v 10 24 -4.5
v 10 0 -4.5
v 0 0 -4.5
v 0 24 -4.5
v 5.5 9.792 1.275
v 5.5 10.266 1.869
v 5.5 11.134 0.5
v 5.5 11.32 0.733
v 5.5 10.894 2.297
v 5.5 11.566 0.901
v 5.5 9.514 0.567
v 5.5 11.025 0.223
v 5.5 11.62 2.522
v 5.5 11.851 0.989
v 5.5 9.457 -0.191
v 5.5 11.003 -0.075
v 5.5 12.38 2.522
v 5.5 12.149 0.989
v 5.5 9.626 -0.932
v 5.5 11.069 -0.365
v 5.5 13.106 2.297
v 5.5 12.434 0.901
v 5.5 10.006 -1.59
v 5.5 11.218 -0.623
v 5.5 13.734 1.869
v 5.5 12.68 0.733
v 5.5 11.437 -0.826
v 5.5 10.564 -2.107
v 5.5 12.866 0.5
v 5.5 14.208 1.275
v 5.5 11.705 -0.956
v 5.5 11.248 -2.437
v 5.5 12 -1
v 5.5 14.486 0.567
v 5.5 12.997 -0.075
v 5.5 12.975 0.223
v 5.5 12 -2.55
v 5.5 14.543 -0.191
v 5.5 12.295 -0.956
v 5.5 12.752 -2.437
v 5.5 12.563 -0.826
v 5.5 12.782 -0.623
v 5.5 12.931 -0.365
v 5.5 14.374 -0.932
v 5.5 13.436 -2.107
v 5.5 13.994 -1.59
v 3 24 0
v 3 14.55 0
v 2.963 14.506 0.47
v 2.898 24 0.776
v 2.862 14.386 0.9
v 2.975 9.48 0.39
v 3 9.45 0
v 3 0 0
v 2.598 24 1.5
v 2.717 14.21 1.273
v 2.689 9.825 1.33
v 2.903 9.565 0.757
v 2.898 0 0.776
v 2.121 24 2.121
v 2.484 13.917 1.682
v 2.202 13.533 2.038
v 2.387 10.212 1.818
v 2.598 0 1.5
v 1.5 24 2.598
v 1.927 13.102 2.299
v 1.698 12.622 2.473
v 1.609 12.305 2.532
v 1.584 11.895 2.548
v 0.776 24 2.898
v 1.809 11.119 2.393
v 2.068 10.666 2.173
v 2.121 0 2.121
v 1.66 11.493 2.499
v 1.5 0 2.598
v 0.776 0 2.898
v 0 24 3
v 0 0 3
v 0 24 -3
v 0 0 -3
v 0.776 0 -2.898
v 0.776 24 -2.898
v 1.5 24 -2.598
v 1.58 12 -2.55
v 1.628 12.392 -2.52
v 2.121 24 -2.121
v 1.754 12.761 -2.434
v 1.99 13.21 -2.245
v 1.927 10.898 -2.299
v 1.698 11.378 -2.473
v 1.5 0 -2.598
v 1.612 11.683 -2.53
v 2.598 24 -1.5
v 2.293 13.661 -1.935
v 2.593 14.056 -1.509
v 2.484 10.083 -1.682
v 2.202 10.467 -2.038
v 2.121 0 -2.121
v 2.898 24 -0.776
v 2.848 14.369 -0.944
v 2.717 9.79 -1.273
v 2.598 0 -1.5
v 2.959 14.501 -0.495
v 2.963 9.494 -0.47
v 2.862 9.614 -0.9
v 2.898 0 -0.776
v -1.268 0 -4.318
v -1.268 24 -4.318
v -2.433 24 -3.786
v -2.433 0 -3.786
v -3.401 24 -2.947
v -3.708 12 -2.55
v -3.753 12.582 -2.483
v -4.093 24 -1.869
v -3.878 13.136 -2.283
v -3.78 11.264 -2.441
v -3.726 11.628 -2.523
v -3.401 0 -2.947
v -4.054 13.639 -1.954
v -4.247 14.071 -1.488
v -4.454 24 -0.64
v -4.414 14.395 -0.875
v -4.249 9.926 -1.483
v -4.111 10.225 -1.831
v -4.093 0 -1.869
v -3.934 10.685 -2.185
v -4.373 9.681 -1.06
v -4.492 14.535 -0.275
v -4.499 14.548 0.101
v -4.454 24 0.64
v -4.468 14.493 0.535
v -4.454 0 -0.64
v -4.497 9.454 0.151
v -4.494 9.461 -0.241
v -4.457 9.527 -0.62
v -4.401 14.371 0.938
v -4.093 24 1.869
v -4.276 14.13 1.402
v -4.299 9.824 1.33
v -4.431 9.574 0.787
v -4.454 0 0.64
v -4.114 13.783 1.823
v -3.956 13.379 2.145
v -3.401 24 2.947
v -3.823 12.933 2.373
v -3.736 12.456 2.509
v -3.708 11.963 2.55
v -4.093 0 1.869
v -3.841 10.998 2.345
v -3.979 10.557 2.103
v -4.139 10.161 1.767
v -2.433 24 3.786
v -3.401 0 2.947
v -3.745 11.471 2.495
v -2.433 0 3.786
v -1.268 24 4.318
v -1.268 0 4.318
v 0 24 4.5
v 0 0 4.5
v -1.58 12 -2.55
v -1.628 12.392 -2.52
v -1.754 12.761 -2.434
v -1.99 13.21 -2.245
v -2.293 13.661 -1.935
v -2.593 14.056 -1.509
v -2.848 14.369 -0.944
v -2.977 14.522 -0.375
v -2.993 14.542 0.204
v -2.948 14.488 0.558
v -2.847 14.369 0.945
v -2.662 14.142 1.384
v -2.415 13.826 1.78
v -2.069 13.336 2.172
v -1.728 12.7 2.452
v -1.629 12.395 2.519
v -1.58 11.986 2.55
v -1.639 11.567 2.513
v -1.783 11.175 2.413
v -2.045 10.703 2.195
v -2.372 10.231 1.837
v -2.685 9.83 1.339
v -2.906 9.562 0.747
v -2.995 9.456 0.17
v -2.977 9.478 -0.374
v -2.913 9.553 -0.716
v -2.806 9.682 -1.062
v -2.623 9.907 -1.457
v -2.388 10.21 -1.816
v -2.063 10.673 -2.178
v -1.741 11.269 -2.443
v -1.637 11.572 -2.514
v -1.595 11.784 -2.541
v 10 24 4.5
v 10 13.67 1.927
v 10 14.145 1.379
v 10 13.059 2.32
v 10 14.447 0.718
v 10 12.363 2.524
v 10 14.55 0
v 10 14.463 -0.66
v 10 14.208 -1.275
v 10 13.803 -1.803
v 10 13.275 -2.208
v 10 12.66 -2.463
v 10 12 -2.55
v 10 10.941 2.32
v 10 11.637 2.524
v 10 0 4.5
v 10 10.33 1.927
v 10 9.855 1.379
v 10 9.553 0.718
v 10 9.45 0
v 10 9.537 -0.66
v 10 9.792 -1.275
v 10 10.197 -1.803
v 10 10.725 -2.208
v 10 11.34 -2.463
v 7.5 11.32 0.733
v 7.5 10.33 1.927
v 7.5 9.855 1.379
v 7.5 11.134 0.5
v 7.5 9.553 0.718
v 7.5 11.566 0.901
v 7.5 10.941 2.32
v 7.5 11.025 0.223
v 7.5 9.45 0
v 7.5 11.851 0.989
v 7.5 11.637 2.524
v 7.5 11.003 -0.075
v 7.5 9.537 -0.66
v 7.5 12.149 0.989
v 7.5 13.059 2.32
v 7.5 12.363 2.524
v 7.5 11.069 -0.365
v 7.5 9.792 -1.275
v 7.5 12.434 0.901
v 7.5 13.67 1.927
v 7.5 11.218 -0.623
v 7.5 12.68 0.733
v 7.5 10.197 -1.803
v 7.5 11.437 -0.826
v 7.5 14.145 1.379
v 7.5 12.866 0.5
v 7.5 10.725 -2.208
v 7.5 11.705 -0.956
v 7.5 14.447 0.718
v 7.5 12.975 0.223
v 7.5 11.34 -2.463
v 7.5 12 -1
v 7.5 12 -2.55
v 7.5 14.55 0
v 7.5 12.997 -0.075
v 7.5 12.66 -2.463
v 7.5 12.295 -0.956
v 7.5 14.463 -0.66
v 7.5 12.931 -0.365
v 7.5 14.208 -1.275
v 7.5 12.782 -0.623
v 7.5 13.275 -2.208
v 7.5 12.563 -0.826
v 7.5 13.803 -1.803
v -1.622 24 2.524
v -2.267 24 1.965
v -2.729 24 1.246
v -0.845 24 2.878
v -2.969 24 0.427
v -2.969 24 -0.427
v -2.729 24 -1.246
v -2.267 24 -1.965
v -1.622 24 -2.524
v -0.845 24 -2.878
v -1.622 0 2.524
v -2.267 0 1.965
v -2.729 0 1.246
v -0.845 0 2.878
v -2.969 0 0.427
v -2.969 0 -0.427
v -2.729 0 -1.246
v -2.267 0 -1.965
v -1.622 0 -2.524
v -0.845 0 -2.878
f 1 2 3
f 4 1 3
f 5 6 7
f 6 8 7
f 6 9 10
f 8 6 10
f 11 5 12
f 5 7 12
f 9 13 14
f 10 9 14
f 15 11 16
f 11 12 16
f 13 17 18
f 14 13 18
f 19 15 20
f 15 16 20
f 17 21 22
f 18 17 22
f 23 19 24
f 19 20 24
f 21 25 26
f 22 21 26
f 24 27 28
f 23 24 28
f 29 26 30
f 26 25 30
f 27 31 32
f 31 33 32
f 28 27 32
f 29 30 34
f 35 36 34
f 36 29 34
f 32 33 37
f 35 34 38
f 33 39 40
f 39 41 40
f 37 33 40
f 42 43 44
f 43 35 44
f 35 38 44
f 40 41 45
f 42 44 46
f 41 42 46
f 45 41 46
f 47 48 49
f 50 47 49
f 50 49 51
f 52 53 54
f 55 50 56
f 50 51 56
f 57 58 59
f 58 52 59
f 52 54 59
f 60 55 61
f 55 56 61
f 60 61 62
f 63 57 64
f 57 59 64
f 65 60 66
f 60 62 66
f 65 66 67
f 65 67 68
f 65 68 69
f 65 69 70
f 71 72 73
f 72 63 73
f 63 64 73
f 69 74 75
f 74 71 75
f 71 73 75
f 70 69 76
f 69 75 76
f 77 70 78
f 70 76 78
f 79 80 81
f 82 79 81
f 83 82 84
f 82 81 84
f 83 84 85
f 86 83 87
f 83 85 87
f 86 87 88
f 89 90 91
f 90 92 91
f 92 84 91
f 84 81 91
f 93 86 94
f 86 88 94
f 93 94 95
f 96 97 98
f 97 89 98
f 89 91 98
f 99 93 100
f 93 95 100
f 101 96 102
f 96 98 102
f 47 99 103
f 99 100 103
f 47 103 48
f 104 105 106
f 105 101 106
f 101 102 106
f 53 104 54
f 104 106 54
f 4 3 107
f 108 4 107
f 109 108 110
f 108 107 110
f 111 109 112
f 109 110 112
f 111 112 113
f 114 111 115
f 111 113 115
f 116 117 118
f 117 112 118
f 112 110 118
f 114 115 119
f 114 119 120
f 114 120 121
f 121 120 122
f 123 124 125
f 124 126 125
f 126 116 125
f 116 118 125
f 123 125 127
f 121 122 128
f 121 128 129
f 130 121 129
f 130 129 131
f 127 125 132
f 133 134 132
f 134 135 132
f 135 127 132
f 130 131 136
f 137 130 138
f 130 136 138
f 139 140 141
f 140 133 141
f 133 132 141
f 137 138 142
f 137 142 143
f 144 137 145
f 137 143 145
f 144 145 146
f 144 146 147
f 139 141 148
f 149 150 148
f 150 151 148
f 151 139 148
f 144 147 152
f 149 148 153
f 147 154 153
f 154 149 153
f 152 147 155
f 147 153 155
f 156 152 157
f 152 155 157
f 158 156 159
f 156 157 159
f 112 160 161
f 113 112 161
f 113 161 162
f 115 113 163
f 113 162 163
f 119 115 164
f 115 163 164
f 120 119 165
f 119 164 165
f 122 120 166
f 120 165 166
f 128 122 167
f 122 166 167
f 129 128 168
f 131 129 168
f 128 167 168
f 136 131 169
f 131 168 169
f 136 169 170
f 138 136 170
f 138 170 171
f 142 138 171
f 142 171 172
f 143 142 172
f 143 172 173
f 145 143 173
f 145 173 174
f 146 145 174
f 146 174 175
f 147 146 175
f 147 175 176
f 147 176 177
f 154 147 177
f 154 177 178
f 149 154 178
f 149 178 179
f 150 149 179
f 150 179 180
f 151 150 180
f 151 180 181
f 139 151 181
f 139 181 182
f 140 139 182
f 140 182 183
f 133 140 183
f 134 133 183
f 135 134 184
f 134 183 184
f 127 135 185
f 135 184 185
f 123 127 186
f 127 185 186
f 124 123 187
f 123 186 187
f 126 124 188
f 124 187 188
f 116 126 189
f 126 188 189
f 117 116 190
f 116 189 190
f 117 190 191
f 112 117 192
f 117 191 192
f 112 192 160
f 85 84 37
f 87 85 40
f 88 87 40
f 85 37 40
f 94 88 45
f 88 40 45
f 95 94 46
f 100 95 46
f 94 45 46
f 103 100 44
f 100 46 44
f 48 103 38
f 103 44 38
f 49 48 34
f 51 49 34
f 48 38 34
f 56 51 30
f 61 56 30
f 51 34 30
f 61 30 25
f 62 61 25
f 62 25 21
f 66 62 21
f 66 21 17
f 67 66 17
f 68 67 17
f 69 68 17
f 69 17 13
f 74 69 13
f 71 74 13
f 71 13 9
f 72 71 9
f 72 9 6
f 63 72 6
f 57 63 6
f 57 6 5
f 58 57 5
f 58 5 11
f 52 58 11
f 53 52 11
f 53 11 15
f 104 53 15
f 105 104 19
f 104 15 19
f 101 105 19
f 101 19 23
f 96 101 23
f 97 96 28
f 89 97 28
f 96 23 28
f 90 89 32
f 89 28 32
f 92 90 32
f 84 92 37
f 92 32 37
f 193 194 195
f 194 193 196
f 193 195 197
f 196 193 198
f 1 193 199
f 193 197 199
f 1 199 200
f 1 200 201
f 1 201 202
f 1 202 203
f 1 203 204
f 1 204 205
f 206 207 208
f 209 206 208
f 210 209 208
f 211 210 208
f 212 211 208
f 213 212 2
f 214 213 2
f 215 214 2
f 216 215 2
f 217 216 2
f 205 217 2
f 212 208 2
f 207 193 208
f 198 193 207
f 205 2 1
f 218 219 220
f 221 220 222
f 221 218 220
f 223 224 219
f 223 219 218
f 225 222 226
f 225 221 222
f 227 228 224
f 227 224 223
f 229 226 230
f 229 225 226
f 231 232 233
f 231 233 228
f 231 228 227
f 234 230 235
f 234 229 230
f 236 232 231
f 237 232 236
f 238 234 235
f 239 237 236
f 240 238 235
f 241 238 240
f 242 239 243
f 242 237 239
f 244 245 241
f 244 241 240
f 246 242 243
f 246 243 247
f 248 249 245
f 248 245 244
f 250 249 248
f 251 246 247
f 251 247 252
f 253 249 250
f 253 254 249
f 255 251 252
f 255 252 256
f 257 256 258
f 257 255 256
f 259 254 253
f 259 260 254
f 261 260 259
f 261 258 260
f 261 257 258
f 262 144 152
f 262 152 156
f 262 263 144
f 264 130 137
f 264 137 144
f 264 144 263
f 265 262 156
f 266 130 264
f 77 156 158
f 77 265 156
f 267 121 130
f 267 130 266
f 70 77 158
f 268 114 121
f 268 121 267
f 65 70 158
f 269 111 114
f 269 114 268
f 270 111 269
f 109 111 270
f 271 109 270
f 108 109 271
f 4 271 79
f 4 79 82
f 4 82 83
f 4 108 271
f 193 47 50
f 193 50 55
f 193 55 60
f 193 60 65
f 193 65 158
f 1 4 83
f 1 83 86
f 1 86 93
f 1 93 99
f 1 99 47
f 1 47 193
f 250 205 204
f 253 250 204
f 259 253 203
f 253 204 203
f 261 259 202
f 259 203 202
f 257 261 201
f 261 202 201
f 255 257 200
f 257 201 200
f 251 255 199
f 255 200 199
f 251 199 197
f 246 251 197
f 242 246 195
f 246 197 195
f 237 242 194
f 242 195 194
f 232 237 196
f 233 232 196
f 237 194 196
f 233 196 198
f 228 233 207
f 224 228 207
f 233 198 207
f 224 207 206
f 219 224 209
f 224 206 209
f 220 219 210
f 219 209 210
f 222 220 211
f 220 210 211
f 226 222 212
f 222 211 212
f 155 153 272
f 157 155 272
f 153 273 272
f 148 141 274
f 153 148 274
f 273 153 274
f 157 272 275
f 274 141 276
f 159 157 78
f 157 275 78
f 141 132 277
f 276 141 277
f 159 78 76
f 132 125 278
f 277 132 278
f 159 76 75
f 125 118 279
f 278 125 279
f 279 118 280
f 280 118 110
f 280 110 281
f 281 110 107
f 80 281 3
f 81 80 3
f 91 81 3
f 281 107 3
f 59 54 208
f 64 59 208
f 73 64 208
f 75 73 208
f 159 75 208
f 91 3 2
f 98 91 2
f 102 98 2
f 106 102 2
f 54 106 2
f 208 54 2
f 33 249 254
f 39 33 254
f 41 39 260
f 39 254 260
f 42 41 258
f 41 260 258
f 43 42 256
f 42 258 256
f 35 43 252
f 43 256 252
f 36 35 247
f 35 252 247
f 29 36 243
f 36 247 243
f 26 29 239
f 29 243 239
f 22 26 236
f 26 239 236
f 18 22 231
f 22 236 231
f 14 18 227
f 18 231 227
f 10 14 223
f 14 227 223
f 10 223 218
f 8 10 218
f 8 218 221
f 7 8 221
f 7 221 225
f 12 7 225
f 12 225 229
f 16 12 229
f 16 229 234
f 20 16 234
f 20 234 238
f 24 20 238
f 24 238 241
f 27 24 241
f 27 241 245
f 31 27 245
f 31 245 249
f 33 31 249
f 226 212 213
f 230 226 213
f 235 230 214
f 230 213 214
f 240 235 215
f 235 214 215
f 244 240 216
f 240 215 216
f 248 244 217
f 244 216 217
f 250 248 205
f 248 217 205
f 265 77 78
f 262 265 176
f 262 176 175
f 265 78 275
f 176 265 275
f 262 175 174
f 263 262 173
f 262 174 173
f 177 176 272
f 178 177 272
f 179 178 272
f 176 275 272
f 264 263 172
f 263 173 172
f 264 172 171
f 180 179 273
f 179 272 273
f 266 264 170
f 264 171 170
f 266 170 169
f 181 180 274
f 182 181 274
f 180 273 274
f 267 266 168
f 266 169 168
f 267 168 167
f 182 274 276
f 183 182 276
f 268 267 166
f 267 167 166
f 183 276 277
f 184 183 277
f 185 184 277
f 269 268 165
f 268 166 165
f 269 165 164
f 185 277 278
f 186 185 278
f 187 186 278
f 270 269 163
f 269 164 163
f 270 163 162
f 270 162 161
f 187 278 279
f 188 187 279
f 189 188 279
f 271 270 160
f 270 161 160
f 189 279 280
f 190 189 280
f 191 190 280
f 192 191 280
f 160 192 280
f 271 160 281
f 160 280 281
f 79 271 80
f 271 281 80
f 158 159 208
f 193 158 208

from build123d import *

# Parameters (mm, degrees)
BOSS_EXTRUDE1_DEPTH = 24
CUT_EXTRUDE1_DEPTH  = 2.5
SKETCH3_R           = 1
CUT_EXTRUDE3_DEPTH  = 8.5
CUT_EXTRUDE4_START  = 5
SKETCH4_R           = 2.55
CUT_EXTRUDE4_DEPTH  = 5
SKETCH5_R           = 2.55
CUT_EXTRUDE5_DEPTH  = 10


with BuildPart() as part:
    # Sketch1 → Boss-Extrude1 (new body)
    with BuildSketch(Plane(origin=(0, 0, 0), x_dir=(1, 0, 0), z_dir=(0, 1, 0))):
        with BuildLine():
            ThreePointArc((0, -3), (-3, 0), (0, 3))
            Line((0, 3), (0, 4.5))
            ThreePointArc((0, 4.5), (-4.5, 0), (0, -4.5))
            Line((0, -4.5), (0, -3))
        make_face()
        with BuildLine():
            Line((0, 4.5), (0, 3))
            ThreePointArc((0, 3), (2.121320344, 2.121320344), (3, 0))
            ThreePointArc((3, 0), (2.121320344, -2.121320344), (0, -3))
            Line((0, -3), (0, -4.5))
            ThreePointArc((0, -4.5), (3.181980515, -3.181980515), (4.5, 0))
            ThreePointArc((4.5, 0), (3.181980515, 3.181980515), (0, 4.5))
        make_face()
        with BuildLine():
            Line((10, 4.5), (0, 4.5))
            ThreePointArc((0, 4.5), (3.181980515, 3.181980515), (4.5, 0))
            ThreePointArc((4.5, 0), (3.181980515, -3.181980515), (0, -4.5))
            Line((0, -4.5), (10, -4.5))
            Line((10, -4.5), (10, 4.5))
        make_face()
    extrude(amount=BOSS_EXTRUDE1_DEPTH)

    # Sketch2 → Cut-Extrude1 (cut)
    with BuildSketch(Plane(origin=(10, 0, 0), x_dir=(0, 0, -1), z_dir=(1, 0, 0))):
        with BuildLine():
            ThreePointArc((2.55, 12), (1.803122292, 13.803122292), (0, 14.55))
            Line((0, 14.55), (0, 9.45))
            ThreePointArc((0, 9.45), (1.803122292, 10.196877708), (2.55, 12))
        make_face()
        with BuildLine():
            Line((0, 9.45), (0, 14.55))
            ThreePointArc((0, 14.55), (-2.55, 12), (0, 9.45))
        make_face()
    extrude(amount=-CUT_EXTRUDE1_DEPTH, mode=Mode.SUBTRACT)

    # Sketch3 → Cut-Extrude3 (cut)
    with BuildSketch(Plane(origin=(7.5, 0, 0), x_dir=(0, 0, -1), z_dir=(1, 0, 0))):
        with Locations((0, 12)):
            Circle(SKETCH3_R)
    extrude(amount=-CUT_EXTRUDE3_DEPTH, mode=Mode.SUBTRACT)

    # Sketch4 → Cut-Extrude4 (cut)
    with BuildSketch(Plane(origin=(0.5, 0, 0), x_dir=(0, 0, -1), z_dir=(1, 0, 0)).offset(CUT_EXTRUDE4_START)):
        with Locations((0, 12)):
            Circle(SKETCH4_R)
    extrude(amount=-CUT_EXTRUDE4_DEPTH, mode=Mode.SUBTRACT)

    # Sketch5 → Cut-Extrude5 (cut)
    with BuildSketch(Plane(origin=(0.5, 0, 0), x_dir=(0, 0, -1), z_dir=(1, 0, 0))):
        with Locations((0, 12)):
            Circle(SKETCH5_R)
    extrude(amount=-CUT_EXTRUDE5_DEPTH, mode=Mode.SUBTRACT)


solid = part.part
